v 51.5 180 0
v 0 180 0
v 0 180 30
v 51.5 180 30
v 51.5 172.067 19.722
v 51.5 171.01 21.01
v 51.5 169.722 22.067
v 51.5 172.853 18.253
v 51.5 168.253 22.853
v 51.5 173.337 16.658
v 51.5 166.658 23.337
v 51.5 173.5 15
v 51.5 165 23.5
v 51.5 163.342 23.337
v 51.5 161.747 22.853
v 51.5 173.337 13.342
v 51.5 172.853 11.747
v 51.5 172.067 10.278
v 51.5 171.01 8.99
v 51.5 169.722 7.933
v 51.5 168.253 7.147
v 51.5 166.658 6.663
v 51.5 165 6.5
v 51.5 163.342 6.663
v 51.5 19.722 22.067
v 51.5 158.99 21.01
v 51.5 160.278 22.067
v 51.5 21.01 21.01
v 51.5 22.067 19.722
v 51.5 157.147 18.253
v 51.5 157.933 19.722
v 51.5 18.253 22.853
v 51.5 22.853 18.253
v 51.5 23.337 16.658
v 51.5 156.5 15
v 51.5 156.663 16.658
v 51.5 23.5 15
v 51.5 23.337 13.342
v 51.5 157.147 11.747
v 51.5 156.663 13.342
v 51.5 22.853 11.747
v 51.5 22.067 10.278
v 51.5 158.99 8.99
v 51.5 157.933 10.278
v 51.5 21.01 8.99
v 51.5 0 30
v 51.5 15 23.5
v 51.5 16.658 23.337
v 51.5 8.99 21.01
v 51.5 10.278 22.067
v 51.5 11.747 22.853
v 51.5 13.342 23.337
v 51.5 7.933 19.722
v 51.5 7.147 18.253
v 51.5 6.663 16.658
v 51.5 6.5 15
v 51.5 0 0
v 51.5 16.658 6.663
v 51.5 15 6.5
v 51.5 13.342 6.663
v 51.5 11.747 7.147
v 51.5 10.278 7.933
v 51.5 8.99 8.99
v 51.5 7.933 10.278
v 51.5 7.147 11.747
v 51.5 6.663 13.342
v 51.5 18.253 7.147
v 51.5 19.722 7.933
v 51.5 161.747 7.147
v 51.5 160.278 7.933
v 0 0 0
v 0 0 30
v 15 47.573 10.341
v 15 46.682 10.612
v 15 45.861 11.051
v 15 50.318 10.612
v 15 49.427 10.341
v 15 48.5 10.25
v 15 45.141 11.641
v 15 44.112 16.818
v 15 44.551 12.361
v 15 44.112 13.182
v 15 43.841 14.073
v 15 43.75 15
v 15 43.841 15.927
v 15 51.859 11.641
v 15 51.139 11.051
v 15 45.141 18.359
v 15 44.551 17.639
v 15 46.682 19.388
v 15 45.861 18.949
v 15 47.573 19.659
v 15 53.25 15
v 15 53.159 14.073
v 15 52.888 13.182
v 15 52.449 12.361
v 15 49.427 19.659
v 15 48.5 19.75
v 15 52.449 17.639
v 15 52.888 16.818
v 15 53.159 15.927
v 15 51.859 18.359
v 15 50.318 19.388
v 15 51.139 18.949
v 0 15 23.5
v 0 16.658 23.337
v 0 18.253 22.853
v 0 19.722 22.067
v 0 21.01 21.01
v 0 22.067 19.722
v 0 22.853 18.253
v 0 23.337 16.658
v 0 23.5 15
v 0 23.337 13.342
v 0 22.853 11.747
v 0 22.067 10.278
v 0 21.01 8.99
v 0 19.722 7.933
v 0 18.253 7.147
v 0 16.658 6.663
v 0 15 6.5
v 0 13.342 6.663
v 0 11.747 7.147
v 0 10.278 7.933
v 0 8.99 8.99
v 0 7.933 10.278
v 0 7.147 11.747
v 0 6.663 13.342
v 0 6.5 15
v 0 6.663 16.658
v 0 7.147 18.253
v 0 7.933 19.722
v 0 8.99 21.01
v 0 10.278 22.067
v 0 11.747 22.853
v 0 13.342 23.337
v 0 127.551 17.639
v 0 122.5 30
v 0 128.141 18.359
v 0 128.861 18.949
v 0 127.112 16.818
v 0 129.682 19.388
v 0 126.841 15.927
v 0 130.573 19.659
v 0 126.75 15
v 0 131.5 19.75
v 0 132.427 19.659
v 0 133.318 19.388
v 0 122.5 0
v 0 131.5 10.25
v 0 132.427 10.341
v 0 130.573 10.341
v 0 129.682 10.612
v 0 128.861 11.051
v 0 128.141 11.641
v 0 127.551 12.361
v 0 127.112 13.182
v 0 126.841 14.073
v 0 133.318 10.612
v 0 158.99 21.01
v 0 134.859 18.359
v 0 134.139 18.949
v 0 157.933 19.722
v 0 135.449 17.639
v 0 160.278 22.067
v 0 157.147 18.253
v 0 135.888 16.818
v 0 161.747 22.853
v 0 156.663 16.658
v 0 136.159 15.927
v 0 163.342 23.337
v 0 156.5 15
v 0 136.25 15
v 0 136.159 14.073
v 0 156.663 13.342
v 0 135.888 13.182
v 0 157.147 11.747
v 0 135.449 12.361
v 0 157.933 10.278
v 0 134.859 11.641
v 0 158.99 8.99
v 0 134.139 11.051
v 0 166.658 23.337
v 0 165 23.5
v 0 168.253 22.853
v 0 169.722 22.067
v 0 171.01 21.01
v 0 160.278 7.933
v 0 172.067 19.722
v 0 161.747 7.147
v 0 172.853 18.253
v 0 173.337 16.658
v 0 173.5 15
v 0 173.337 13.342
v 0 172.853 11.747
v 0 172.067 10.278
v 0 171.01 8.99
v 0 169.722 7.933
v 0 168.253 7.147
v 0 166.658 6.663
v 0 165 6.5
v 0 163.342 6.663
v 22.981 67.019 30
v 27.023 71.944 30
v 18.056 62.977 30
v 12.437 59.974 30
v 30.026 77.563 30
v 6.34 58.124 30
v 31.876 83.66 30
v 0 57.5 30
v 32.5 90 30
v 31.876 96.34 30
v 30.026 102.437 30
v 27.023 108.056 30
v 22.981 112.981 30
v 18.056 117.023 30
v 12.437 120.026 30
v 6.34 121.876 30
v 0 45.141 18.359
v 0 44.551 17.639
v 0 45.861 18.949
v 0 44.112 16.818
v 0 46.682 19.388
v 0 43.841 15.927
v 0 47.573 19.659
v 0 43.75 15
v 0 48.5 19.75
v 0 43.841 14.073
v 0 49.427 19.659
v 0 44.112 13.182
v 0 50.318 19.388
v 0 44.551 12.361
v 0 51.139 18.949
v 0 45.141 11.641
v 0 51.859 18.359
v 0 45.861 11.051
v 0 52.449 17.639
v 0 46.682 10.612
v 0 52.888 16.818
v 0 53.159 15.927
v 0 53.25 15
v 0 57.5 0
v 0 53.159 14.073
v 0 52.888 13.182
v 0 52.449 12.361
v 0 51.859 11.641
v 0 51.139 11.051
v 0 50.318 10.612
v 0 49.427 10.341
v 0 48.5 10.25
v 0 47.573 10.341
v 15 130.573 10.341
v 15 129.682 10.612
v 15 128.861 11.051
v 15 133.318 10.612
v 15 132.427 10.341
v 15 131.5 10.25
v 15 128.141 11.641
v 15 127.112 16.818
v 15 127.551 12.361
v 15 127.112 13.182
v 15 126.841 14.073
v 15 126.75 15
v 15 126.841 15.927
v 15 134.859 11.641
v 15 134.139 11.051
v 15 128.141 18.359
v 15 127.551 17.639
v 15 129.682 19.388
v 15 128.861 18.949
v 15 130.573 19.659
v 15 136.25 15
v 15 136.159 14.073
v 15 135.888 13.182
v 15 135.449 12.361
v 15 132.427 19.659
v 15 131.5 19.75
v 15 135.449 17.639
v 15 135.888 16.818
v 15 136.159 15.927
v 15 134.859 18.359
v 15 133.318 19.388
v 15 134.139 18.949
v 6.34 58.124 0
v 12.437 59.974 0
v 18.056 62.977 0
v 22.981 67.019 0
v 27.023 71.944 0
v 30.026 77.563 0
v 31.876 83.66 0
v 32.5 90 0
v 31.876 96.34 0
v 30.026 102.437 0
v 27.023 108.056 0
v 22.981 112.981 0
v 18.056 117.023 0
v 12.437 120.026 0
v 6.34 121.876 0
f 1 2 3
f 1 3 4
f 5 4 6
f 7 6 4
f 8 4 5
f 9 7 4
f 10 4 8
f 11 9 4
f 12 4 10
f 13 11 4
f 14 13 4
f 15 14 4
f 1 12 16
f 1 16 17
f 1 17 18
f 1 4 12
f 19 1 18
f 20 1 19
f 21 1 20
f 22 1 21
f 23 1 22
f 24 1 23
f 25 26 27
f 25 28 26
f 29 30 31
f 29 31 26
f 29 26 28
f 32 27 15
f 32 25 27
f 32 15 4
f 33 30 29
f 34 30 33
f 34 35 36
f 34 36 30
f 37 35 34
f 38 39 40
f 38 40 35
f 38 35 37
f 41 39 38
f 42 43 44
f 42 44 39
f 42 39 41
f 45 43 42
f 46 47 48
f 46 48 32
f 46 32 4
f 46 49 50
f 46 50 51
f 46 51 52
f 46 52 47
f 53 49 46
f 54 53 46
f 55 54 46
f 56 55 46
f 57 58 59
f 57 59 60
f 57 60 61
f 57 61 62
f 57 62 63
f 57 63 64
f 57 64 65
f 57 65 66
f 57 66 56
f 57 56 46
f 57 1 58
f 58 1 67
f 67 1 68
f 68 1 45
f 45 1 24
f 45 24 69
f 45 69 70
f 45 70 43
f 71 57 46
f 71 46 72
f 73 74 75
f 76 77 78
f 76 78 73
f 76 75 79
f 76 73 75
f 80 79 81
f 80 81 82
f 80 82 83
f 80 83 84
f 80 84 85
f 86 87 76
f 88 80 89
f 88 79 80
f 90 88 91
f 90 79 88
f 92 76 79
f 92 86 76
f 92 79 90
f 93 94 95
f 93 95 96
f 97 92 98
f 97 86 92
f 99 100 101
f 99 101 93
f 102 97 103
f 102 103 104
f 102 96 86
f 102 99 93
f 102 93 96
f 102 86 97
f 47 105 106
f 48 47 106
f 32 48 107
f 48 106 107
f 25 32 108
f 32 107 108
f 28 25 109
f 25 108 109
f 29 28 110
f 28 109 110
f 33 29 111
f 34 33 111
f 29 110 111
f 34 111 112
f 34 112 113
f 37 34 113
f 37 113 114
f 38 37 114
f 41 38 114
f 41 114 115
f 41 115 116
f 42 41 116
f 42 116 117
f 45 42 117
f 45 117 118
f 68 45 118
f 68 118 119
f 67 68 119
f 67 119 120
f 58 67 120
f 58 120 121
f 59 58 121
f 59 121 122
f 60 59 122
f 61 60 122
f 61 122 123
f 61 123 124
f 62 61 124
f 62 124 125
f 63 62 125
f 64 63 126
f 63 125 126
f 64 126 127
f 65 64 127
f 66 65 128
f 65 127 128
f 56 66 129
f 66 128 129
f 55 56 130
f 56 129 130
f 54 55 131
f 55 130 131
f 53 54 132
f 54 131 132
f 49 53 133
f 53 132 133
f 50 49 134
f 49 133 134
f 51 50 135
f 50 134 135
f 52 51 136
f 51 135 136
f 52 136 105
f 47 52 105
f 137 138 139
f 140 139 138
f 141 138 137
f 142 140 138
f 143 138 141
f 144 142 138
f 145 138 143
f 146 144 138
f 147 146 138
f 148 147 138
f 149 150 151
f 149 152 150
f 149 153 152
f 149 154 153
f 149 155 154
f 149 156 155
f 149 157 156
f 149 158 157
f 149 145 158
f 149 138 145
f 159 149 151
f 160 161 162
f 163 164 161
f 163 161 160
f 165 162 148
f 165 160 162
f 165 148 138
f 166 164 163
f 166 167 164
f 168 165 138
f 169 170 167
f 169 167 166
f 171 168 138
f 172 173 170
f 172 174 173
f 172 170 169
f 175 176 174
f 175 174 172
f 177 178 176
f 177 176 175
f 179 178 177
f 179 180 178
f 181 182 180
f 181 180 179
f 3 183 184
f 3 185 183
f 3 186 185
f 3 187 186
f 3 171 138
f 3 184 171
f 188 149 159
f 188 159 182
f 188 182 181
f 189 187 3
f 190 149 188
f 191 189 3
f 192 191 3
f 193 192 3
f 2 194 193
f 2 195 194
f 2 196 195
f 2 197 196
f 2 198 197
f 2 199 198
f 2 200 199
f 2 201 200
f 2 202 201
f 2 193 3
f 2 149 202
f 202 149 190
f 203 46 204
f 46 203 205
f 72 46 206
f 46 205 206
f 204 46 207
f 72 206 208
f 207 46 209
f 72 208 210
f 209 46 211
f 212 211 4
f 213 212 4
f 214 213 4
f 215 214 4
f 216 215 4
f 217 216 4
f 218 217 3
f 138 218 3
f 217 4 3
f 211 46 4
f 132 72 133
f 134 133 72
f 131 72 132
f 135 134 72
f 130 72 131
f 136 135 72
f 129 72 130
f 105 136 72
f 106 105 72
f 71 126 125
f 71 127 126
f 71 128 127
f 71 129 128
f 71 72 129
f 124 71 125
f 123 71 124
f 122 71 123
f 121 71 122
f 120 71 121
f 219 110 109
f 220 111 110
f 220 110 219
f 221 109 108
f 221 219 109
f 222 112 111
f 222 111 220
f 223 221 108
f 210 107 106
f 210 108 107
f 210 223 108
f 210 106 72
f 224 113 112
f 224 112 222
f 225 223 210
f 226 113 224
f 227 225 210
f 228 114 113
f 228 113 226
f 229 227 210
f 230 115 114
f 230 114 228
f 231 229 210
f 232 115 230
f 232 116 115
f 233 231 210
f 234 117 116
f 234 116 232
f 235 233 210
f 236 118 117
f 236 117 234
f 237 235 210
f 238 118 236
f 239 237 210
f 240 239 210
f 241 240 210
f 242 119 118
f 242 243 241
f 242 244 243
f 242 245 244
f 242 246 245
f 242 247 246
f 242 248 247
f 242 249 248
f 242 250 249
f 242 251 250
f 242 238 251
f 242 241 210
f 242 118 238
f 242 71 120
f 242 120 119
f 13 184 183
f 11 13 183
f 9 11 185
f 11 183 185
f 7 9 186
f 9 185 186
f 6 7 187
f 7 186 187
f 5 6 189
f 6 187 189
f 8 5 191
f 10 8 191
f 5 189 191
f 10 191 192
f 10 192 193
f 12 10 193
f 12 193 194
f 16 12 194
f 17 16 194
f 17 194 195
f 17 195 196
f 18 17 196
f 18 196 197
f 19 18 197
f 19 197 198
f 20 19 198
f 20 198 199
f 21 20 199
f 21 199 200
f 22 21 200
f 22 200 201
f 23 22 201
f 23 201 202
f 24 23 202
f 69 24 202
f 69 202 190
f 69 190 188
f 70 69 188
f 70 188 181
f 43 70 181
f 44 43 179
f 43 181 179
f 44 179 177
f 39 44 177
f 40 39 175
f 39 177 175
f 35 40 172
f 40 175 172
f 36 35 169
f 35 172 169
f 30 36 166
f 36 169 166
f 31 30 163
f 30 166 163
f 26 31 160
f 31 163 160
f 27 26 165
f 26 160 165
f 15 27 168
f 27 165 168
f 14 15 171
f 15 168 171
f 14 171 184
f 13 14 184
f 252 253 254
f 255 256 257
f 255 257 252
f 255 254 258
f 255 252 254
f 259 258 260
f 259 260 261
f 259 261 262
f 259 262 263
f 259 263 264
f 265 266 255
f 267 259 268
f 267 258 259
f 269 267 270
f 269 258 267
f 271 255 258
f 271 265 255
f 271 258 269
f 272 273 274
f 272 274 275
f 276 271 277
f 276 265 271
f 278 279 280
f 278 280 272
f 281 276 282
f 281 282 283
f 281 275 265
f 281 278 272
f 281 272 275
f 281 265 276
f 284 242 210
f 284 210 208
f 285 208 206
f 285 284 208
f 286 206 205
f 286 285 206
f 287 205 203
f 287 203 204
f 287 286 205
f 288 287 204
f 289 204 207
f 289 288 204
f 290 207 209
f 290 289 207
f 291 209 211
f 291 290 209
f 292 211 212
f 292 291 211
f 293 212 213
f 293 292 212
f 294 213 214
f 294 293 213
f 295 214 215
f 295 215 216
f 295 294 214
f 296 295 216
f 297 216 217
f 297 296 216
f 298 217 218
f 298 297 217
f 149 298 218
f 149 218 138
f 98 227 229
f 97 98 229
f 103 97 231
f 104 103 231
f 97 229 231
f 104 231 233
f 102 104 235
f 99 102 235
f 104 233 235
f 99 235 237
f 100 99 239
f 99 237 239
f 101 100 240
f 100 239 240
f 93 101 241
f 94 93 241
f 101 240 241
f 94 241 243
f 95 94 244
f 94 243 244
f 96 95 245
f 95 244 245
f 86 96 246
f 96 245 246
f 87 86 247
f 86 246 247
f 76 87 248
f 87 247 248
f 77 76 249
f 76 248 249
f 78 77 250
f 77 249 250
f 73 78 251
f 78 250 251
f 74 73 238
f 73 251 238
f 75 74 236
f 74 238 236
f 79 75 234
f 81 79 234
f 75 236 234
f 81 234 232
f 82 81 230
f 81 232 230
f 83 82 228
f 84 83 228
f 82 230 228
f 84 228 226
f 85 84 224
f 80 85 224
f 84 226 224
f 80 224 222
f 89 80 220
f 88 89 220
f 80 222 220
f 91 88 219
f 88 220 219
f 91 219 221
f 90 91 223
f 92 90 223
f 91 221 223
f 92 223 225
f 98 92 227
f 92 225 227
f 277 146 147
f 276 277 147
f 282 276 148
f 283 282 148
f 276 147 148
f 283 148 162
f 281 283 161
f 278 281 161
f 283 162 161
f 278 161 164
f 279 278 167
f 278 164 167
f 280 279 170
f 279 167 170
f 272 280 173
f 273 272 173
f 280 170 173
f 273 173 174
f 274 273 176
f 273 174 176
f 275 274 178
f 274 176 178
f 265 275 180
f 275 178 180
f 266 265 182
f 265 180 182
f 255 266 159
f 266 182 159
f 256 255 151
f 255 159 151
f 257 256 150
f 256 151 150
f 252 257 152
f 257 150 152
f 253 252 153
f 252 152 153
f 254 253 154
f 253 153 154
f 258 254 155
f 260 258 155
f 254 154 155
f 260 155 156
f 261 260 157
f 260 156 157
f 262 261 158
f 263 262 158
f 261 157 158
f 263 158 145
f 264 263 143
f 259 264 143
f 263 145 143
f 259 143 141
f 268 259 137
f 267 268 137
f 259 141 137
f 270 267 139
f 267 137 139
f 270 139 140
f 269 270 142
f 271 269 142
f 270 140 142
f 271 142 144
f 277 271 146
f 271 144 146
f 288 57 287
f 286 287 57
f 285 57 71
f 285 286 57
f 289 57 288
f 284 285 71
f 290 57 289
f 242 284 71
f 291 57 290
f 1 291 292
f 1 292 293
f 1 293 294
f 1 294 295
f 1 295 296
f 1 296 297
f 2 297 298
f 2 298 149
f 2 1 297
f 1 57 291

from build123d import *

# Parameters (mm, degrees)
BOSS_EXTRUDE1_DEPTH = 30
SKETCH2_R           = 8.5
CUT_EXTRUDE1_DEPTH  = 52.5
LPATTERN1_COUNT     = 2
LPATTERN1_PITCH     = 150
SKETCH3_R           = 4.75
CUT_EXTRUDE2_DEPTH  = 15
LPATTERN2_COUNT     = 2
LPATTERN2_PITCH     = 83


with BuildPart() as part:
    # Sketch1 → Boss-Extrude1 (new body)
    with BuildSketch(Plane.XY):
        with BuildLine():
            Line((0, 122.5), (0, 180))
            Line((0, 180), (51.5, 180))
            Line((51.5, 180), (51.5, 0))
            Line((51.5, 0), (0, 0))
            Line((0, 0), (0, 57.5))
            ThreePointArc((0, 57.5), (32.5, 90), (0, 122.5))
        make_face()
    extrude(amount=BOSS_EXTRUDE1_DEPTH)

    # Sketch2 → Cut-Extrude1 (cut, through all)
    with BuildSketch(Plane.ZY):
        with Locations((15, 15)):
            Circle(SKETCH2_R)
    cut_extrude1 = extrude(amount=-CUT_EXTRUDE1_DEPTH, mode=Mode.SUBTRACT)

    # LPattern1: Cut-Extrude1 ×2
    with Locations(*[(0, i * LPATTERN1_PITCH, 0) for i in range(1, LPATTERN1_COUNT)]):
        add(cut_extrude1, mode=Mode.SUBTRACT)

    # Sketch3 → Cut-Extrude2 (cut)
    with BuildSketch(Plane.ZY):
        with Locations((15, 48.5)):
            Circle(SKETCH3_R)
    cut_extrude2 = extrude(amount=-CUT_EXTRUDE2_DEPTH, mode=Mode.SUBTRACT)

    # LPattern2: Cut-Extrude2 ×2
    with Locations(*[(0, i * LPATTERN2_PITCH, 0) for i in range(1, LPATTERN2_COUNT)]):
        add(cut_extrude2, mode=Mode.SUBTRACT)


solid = part.part
